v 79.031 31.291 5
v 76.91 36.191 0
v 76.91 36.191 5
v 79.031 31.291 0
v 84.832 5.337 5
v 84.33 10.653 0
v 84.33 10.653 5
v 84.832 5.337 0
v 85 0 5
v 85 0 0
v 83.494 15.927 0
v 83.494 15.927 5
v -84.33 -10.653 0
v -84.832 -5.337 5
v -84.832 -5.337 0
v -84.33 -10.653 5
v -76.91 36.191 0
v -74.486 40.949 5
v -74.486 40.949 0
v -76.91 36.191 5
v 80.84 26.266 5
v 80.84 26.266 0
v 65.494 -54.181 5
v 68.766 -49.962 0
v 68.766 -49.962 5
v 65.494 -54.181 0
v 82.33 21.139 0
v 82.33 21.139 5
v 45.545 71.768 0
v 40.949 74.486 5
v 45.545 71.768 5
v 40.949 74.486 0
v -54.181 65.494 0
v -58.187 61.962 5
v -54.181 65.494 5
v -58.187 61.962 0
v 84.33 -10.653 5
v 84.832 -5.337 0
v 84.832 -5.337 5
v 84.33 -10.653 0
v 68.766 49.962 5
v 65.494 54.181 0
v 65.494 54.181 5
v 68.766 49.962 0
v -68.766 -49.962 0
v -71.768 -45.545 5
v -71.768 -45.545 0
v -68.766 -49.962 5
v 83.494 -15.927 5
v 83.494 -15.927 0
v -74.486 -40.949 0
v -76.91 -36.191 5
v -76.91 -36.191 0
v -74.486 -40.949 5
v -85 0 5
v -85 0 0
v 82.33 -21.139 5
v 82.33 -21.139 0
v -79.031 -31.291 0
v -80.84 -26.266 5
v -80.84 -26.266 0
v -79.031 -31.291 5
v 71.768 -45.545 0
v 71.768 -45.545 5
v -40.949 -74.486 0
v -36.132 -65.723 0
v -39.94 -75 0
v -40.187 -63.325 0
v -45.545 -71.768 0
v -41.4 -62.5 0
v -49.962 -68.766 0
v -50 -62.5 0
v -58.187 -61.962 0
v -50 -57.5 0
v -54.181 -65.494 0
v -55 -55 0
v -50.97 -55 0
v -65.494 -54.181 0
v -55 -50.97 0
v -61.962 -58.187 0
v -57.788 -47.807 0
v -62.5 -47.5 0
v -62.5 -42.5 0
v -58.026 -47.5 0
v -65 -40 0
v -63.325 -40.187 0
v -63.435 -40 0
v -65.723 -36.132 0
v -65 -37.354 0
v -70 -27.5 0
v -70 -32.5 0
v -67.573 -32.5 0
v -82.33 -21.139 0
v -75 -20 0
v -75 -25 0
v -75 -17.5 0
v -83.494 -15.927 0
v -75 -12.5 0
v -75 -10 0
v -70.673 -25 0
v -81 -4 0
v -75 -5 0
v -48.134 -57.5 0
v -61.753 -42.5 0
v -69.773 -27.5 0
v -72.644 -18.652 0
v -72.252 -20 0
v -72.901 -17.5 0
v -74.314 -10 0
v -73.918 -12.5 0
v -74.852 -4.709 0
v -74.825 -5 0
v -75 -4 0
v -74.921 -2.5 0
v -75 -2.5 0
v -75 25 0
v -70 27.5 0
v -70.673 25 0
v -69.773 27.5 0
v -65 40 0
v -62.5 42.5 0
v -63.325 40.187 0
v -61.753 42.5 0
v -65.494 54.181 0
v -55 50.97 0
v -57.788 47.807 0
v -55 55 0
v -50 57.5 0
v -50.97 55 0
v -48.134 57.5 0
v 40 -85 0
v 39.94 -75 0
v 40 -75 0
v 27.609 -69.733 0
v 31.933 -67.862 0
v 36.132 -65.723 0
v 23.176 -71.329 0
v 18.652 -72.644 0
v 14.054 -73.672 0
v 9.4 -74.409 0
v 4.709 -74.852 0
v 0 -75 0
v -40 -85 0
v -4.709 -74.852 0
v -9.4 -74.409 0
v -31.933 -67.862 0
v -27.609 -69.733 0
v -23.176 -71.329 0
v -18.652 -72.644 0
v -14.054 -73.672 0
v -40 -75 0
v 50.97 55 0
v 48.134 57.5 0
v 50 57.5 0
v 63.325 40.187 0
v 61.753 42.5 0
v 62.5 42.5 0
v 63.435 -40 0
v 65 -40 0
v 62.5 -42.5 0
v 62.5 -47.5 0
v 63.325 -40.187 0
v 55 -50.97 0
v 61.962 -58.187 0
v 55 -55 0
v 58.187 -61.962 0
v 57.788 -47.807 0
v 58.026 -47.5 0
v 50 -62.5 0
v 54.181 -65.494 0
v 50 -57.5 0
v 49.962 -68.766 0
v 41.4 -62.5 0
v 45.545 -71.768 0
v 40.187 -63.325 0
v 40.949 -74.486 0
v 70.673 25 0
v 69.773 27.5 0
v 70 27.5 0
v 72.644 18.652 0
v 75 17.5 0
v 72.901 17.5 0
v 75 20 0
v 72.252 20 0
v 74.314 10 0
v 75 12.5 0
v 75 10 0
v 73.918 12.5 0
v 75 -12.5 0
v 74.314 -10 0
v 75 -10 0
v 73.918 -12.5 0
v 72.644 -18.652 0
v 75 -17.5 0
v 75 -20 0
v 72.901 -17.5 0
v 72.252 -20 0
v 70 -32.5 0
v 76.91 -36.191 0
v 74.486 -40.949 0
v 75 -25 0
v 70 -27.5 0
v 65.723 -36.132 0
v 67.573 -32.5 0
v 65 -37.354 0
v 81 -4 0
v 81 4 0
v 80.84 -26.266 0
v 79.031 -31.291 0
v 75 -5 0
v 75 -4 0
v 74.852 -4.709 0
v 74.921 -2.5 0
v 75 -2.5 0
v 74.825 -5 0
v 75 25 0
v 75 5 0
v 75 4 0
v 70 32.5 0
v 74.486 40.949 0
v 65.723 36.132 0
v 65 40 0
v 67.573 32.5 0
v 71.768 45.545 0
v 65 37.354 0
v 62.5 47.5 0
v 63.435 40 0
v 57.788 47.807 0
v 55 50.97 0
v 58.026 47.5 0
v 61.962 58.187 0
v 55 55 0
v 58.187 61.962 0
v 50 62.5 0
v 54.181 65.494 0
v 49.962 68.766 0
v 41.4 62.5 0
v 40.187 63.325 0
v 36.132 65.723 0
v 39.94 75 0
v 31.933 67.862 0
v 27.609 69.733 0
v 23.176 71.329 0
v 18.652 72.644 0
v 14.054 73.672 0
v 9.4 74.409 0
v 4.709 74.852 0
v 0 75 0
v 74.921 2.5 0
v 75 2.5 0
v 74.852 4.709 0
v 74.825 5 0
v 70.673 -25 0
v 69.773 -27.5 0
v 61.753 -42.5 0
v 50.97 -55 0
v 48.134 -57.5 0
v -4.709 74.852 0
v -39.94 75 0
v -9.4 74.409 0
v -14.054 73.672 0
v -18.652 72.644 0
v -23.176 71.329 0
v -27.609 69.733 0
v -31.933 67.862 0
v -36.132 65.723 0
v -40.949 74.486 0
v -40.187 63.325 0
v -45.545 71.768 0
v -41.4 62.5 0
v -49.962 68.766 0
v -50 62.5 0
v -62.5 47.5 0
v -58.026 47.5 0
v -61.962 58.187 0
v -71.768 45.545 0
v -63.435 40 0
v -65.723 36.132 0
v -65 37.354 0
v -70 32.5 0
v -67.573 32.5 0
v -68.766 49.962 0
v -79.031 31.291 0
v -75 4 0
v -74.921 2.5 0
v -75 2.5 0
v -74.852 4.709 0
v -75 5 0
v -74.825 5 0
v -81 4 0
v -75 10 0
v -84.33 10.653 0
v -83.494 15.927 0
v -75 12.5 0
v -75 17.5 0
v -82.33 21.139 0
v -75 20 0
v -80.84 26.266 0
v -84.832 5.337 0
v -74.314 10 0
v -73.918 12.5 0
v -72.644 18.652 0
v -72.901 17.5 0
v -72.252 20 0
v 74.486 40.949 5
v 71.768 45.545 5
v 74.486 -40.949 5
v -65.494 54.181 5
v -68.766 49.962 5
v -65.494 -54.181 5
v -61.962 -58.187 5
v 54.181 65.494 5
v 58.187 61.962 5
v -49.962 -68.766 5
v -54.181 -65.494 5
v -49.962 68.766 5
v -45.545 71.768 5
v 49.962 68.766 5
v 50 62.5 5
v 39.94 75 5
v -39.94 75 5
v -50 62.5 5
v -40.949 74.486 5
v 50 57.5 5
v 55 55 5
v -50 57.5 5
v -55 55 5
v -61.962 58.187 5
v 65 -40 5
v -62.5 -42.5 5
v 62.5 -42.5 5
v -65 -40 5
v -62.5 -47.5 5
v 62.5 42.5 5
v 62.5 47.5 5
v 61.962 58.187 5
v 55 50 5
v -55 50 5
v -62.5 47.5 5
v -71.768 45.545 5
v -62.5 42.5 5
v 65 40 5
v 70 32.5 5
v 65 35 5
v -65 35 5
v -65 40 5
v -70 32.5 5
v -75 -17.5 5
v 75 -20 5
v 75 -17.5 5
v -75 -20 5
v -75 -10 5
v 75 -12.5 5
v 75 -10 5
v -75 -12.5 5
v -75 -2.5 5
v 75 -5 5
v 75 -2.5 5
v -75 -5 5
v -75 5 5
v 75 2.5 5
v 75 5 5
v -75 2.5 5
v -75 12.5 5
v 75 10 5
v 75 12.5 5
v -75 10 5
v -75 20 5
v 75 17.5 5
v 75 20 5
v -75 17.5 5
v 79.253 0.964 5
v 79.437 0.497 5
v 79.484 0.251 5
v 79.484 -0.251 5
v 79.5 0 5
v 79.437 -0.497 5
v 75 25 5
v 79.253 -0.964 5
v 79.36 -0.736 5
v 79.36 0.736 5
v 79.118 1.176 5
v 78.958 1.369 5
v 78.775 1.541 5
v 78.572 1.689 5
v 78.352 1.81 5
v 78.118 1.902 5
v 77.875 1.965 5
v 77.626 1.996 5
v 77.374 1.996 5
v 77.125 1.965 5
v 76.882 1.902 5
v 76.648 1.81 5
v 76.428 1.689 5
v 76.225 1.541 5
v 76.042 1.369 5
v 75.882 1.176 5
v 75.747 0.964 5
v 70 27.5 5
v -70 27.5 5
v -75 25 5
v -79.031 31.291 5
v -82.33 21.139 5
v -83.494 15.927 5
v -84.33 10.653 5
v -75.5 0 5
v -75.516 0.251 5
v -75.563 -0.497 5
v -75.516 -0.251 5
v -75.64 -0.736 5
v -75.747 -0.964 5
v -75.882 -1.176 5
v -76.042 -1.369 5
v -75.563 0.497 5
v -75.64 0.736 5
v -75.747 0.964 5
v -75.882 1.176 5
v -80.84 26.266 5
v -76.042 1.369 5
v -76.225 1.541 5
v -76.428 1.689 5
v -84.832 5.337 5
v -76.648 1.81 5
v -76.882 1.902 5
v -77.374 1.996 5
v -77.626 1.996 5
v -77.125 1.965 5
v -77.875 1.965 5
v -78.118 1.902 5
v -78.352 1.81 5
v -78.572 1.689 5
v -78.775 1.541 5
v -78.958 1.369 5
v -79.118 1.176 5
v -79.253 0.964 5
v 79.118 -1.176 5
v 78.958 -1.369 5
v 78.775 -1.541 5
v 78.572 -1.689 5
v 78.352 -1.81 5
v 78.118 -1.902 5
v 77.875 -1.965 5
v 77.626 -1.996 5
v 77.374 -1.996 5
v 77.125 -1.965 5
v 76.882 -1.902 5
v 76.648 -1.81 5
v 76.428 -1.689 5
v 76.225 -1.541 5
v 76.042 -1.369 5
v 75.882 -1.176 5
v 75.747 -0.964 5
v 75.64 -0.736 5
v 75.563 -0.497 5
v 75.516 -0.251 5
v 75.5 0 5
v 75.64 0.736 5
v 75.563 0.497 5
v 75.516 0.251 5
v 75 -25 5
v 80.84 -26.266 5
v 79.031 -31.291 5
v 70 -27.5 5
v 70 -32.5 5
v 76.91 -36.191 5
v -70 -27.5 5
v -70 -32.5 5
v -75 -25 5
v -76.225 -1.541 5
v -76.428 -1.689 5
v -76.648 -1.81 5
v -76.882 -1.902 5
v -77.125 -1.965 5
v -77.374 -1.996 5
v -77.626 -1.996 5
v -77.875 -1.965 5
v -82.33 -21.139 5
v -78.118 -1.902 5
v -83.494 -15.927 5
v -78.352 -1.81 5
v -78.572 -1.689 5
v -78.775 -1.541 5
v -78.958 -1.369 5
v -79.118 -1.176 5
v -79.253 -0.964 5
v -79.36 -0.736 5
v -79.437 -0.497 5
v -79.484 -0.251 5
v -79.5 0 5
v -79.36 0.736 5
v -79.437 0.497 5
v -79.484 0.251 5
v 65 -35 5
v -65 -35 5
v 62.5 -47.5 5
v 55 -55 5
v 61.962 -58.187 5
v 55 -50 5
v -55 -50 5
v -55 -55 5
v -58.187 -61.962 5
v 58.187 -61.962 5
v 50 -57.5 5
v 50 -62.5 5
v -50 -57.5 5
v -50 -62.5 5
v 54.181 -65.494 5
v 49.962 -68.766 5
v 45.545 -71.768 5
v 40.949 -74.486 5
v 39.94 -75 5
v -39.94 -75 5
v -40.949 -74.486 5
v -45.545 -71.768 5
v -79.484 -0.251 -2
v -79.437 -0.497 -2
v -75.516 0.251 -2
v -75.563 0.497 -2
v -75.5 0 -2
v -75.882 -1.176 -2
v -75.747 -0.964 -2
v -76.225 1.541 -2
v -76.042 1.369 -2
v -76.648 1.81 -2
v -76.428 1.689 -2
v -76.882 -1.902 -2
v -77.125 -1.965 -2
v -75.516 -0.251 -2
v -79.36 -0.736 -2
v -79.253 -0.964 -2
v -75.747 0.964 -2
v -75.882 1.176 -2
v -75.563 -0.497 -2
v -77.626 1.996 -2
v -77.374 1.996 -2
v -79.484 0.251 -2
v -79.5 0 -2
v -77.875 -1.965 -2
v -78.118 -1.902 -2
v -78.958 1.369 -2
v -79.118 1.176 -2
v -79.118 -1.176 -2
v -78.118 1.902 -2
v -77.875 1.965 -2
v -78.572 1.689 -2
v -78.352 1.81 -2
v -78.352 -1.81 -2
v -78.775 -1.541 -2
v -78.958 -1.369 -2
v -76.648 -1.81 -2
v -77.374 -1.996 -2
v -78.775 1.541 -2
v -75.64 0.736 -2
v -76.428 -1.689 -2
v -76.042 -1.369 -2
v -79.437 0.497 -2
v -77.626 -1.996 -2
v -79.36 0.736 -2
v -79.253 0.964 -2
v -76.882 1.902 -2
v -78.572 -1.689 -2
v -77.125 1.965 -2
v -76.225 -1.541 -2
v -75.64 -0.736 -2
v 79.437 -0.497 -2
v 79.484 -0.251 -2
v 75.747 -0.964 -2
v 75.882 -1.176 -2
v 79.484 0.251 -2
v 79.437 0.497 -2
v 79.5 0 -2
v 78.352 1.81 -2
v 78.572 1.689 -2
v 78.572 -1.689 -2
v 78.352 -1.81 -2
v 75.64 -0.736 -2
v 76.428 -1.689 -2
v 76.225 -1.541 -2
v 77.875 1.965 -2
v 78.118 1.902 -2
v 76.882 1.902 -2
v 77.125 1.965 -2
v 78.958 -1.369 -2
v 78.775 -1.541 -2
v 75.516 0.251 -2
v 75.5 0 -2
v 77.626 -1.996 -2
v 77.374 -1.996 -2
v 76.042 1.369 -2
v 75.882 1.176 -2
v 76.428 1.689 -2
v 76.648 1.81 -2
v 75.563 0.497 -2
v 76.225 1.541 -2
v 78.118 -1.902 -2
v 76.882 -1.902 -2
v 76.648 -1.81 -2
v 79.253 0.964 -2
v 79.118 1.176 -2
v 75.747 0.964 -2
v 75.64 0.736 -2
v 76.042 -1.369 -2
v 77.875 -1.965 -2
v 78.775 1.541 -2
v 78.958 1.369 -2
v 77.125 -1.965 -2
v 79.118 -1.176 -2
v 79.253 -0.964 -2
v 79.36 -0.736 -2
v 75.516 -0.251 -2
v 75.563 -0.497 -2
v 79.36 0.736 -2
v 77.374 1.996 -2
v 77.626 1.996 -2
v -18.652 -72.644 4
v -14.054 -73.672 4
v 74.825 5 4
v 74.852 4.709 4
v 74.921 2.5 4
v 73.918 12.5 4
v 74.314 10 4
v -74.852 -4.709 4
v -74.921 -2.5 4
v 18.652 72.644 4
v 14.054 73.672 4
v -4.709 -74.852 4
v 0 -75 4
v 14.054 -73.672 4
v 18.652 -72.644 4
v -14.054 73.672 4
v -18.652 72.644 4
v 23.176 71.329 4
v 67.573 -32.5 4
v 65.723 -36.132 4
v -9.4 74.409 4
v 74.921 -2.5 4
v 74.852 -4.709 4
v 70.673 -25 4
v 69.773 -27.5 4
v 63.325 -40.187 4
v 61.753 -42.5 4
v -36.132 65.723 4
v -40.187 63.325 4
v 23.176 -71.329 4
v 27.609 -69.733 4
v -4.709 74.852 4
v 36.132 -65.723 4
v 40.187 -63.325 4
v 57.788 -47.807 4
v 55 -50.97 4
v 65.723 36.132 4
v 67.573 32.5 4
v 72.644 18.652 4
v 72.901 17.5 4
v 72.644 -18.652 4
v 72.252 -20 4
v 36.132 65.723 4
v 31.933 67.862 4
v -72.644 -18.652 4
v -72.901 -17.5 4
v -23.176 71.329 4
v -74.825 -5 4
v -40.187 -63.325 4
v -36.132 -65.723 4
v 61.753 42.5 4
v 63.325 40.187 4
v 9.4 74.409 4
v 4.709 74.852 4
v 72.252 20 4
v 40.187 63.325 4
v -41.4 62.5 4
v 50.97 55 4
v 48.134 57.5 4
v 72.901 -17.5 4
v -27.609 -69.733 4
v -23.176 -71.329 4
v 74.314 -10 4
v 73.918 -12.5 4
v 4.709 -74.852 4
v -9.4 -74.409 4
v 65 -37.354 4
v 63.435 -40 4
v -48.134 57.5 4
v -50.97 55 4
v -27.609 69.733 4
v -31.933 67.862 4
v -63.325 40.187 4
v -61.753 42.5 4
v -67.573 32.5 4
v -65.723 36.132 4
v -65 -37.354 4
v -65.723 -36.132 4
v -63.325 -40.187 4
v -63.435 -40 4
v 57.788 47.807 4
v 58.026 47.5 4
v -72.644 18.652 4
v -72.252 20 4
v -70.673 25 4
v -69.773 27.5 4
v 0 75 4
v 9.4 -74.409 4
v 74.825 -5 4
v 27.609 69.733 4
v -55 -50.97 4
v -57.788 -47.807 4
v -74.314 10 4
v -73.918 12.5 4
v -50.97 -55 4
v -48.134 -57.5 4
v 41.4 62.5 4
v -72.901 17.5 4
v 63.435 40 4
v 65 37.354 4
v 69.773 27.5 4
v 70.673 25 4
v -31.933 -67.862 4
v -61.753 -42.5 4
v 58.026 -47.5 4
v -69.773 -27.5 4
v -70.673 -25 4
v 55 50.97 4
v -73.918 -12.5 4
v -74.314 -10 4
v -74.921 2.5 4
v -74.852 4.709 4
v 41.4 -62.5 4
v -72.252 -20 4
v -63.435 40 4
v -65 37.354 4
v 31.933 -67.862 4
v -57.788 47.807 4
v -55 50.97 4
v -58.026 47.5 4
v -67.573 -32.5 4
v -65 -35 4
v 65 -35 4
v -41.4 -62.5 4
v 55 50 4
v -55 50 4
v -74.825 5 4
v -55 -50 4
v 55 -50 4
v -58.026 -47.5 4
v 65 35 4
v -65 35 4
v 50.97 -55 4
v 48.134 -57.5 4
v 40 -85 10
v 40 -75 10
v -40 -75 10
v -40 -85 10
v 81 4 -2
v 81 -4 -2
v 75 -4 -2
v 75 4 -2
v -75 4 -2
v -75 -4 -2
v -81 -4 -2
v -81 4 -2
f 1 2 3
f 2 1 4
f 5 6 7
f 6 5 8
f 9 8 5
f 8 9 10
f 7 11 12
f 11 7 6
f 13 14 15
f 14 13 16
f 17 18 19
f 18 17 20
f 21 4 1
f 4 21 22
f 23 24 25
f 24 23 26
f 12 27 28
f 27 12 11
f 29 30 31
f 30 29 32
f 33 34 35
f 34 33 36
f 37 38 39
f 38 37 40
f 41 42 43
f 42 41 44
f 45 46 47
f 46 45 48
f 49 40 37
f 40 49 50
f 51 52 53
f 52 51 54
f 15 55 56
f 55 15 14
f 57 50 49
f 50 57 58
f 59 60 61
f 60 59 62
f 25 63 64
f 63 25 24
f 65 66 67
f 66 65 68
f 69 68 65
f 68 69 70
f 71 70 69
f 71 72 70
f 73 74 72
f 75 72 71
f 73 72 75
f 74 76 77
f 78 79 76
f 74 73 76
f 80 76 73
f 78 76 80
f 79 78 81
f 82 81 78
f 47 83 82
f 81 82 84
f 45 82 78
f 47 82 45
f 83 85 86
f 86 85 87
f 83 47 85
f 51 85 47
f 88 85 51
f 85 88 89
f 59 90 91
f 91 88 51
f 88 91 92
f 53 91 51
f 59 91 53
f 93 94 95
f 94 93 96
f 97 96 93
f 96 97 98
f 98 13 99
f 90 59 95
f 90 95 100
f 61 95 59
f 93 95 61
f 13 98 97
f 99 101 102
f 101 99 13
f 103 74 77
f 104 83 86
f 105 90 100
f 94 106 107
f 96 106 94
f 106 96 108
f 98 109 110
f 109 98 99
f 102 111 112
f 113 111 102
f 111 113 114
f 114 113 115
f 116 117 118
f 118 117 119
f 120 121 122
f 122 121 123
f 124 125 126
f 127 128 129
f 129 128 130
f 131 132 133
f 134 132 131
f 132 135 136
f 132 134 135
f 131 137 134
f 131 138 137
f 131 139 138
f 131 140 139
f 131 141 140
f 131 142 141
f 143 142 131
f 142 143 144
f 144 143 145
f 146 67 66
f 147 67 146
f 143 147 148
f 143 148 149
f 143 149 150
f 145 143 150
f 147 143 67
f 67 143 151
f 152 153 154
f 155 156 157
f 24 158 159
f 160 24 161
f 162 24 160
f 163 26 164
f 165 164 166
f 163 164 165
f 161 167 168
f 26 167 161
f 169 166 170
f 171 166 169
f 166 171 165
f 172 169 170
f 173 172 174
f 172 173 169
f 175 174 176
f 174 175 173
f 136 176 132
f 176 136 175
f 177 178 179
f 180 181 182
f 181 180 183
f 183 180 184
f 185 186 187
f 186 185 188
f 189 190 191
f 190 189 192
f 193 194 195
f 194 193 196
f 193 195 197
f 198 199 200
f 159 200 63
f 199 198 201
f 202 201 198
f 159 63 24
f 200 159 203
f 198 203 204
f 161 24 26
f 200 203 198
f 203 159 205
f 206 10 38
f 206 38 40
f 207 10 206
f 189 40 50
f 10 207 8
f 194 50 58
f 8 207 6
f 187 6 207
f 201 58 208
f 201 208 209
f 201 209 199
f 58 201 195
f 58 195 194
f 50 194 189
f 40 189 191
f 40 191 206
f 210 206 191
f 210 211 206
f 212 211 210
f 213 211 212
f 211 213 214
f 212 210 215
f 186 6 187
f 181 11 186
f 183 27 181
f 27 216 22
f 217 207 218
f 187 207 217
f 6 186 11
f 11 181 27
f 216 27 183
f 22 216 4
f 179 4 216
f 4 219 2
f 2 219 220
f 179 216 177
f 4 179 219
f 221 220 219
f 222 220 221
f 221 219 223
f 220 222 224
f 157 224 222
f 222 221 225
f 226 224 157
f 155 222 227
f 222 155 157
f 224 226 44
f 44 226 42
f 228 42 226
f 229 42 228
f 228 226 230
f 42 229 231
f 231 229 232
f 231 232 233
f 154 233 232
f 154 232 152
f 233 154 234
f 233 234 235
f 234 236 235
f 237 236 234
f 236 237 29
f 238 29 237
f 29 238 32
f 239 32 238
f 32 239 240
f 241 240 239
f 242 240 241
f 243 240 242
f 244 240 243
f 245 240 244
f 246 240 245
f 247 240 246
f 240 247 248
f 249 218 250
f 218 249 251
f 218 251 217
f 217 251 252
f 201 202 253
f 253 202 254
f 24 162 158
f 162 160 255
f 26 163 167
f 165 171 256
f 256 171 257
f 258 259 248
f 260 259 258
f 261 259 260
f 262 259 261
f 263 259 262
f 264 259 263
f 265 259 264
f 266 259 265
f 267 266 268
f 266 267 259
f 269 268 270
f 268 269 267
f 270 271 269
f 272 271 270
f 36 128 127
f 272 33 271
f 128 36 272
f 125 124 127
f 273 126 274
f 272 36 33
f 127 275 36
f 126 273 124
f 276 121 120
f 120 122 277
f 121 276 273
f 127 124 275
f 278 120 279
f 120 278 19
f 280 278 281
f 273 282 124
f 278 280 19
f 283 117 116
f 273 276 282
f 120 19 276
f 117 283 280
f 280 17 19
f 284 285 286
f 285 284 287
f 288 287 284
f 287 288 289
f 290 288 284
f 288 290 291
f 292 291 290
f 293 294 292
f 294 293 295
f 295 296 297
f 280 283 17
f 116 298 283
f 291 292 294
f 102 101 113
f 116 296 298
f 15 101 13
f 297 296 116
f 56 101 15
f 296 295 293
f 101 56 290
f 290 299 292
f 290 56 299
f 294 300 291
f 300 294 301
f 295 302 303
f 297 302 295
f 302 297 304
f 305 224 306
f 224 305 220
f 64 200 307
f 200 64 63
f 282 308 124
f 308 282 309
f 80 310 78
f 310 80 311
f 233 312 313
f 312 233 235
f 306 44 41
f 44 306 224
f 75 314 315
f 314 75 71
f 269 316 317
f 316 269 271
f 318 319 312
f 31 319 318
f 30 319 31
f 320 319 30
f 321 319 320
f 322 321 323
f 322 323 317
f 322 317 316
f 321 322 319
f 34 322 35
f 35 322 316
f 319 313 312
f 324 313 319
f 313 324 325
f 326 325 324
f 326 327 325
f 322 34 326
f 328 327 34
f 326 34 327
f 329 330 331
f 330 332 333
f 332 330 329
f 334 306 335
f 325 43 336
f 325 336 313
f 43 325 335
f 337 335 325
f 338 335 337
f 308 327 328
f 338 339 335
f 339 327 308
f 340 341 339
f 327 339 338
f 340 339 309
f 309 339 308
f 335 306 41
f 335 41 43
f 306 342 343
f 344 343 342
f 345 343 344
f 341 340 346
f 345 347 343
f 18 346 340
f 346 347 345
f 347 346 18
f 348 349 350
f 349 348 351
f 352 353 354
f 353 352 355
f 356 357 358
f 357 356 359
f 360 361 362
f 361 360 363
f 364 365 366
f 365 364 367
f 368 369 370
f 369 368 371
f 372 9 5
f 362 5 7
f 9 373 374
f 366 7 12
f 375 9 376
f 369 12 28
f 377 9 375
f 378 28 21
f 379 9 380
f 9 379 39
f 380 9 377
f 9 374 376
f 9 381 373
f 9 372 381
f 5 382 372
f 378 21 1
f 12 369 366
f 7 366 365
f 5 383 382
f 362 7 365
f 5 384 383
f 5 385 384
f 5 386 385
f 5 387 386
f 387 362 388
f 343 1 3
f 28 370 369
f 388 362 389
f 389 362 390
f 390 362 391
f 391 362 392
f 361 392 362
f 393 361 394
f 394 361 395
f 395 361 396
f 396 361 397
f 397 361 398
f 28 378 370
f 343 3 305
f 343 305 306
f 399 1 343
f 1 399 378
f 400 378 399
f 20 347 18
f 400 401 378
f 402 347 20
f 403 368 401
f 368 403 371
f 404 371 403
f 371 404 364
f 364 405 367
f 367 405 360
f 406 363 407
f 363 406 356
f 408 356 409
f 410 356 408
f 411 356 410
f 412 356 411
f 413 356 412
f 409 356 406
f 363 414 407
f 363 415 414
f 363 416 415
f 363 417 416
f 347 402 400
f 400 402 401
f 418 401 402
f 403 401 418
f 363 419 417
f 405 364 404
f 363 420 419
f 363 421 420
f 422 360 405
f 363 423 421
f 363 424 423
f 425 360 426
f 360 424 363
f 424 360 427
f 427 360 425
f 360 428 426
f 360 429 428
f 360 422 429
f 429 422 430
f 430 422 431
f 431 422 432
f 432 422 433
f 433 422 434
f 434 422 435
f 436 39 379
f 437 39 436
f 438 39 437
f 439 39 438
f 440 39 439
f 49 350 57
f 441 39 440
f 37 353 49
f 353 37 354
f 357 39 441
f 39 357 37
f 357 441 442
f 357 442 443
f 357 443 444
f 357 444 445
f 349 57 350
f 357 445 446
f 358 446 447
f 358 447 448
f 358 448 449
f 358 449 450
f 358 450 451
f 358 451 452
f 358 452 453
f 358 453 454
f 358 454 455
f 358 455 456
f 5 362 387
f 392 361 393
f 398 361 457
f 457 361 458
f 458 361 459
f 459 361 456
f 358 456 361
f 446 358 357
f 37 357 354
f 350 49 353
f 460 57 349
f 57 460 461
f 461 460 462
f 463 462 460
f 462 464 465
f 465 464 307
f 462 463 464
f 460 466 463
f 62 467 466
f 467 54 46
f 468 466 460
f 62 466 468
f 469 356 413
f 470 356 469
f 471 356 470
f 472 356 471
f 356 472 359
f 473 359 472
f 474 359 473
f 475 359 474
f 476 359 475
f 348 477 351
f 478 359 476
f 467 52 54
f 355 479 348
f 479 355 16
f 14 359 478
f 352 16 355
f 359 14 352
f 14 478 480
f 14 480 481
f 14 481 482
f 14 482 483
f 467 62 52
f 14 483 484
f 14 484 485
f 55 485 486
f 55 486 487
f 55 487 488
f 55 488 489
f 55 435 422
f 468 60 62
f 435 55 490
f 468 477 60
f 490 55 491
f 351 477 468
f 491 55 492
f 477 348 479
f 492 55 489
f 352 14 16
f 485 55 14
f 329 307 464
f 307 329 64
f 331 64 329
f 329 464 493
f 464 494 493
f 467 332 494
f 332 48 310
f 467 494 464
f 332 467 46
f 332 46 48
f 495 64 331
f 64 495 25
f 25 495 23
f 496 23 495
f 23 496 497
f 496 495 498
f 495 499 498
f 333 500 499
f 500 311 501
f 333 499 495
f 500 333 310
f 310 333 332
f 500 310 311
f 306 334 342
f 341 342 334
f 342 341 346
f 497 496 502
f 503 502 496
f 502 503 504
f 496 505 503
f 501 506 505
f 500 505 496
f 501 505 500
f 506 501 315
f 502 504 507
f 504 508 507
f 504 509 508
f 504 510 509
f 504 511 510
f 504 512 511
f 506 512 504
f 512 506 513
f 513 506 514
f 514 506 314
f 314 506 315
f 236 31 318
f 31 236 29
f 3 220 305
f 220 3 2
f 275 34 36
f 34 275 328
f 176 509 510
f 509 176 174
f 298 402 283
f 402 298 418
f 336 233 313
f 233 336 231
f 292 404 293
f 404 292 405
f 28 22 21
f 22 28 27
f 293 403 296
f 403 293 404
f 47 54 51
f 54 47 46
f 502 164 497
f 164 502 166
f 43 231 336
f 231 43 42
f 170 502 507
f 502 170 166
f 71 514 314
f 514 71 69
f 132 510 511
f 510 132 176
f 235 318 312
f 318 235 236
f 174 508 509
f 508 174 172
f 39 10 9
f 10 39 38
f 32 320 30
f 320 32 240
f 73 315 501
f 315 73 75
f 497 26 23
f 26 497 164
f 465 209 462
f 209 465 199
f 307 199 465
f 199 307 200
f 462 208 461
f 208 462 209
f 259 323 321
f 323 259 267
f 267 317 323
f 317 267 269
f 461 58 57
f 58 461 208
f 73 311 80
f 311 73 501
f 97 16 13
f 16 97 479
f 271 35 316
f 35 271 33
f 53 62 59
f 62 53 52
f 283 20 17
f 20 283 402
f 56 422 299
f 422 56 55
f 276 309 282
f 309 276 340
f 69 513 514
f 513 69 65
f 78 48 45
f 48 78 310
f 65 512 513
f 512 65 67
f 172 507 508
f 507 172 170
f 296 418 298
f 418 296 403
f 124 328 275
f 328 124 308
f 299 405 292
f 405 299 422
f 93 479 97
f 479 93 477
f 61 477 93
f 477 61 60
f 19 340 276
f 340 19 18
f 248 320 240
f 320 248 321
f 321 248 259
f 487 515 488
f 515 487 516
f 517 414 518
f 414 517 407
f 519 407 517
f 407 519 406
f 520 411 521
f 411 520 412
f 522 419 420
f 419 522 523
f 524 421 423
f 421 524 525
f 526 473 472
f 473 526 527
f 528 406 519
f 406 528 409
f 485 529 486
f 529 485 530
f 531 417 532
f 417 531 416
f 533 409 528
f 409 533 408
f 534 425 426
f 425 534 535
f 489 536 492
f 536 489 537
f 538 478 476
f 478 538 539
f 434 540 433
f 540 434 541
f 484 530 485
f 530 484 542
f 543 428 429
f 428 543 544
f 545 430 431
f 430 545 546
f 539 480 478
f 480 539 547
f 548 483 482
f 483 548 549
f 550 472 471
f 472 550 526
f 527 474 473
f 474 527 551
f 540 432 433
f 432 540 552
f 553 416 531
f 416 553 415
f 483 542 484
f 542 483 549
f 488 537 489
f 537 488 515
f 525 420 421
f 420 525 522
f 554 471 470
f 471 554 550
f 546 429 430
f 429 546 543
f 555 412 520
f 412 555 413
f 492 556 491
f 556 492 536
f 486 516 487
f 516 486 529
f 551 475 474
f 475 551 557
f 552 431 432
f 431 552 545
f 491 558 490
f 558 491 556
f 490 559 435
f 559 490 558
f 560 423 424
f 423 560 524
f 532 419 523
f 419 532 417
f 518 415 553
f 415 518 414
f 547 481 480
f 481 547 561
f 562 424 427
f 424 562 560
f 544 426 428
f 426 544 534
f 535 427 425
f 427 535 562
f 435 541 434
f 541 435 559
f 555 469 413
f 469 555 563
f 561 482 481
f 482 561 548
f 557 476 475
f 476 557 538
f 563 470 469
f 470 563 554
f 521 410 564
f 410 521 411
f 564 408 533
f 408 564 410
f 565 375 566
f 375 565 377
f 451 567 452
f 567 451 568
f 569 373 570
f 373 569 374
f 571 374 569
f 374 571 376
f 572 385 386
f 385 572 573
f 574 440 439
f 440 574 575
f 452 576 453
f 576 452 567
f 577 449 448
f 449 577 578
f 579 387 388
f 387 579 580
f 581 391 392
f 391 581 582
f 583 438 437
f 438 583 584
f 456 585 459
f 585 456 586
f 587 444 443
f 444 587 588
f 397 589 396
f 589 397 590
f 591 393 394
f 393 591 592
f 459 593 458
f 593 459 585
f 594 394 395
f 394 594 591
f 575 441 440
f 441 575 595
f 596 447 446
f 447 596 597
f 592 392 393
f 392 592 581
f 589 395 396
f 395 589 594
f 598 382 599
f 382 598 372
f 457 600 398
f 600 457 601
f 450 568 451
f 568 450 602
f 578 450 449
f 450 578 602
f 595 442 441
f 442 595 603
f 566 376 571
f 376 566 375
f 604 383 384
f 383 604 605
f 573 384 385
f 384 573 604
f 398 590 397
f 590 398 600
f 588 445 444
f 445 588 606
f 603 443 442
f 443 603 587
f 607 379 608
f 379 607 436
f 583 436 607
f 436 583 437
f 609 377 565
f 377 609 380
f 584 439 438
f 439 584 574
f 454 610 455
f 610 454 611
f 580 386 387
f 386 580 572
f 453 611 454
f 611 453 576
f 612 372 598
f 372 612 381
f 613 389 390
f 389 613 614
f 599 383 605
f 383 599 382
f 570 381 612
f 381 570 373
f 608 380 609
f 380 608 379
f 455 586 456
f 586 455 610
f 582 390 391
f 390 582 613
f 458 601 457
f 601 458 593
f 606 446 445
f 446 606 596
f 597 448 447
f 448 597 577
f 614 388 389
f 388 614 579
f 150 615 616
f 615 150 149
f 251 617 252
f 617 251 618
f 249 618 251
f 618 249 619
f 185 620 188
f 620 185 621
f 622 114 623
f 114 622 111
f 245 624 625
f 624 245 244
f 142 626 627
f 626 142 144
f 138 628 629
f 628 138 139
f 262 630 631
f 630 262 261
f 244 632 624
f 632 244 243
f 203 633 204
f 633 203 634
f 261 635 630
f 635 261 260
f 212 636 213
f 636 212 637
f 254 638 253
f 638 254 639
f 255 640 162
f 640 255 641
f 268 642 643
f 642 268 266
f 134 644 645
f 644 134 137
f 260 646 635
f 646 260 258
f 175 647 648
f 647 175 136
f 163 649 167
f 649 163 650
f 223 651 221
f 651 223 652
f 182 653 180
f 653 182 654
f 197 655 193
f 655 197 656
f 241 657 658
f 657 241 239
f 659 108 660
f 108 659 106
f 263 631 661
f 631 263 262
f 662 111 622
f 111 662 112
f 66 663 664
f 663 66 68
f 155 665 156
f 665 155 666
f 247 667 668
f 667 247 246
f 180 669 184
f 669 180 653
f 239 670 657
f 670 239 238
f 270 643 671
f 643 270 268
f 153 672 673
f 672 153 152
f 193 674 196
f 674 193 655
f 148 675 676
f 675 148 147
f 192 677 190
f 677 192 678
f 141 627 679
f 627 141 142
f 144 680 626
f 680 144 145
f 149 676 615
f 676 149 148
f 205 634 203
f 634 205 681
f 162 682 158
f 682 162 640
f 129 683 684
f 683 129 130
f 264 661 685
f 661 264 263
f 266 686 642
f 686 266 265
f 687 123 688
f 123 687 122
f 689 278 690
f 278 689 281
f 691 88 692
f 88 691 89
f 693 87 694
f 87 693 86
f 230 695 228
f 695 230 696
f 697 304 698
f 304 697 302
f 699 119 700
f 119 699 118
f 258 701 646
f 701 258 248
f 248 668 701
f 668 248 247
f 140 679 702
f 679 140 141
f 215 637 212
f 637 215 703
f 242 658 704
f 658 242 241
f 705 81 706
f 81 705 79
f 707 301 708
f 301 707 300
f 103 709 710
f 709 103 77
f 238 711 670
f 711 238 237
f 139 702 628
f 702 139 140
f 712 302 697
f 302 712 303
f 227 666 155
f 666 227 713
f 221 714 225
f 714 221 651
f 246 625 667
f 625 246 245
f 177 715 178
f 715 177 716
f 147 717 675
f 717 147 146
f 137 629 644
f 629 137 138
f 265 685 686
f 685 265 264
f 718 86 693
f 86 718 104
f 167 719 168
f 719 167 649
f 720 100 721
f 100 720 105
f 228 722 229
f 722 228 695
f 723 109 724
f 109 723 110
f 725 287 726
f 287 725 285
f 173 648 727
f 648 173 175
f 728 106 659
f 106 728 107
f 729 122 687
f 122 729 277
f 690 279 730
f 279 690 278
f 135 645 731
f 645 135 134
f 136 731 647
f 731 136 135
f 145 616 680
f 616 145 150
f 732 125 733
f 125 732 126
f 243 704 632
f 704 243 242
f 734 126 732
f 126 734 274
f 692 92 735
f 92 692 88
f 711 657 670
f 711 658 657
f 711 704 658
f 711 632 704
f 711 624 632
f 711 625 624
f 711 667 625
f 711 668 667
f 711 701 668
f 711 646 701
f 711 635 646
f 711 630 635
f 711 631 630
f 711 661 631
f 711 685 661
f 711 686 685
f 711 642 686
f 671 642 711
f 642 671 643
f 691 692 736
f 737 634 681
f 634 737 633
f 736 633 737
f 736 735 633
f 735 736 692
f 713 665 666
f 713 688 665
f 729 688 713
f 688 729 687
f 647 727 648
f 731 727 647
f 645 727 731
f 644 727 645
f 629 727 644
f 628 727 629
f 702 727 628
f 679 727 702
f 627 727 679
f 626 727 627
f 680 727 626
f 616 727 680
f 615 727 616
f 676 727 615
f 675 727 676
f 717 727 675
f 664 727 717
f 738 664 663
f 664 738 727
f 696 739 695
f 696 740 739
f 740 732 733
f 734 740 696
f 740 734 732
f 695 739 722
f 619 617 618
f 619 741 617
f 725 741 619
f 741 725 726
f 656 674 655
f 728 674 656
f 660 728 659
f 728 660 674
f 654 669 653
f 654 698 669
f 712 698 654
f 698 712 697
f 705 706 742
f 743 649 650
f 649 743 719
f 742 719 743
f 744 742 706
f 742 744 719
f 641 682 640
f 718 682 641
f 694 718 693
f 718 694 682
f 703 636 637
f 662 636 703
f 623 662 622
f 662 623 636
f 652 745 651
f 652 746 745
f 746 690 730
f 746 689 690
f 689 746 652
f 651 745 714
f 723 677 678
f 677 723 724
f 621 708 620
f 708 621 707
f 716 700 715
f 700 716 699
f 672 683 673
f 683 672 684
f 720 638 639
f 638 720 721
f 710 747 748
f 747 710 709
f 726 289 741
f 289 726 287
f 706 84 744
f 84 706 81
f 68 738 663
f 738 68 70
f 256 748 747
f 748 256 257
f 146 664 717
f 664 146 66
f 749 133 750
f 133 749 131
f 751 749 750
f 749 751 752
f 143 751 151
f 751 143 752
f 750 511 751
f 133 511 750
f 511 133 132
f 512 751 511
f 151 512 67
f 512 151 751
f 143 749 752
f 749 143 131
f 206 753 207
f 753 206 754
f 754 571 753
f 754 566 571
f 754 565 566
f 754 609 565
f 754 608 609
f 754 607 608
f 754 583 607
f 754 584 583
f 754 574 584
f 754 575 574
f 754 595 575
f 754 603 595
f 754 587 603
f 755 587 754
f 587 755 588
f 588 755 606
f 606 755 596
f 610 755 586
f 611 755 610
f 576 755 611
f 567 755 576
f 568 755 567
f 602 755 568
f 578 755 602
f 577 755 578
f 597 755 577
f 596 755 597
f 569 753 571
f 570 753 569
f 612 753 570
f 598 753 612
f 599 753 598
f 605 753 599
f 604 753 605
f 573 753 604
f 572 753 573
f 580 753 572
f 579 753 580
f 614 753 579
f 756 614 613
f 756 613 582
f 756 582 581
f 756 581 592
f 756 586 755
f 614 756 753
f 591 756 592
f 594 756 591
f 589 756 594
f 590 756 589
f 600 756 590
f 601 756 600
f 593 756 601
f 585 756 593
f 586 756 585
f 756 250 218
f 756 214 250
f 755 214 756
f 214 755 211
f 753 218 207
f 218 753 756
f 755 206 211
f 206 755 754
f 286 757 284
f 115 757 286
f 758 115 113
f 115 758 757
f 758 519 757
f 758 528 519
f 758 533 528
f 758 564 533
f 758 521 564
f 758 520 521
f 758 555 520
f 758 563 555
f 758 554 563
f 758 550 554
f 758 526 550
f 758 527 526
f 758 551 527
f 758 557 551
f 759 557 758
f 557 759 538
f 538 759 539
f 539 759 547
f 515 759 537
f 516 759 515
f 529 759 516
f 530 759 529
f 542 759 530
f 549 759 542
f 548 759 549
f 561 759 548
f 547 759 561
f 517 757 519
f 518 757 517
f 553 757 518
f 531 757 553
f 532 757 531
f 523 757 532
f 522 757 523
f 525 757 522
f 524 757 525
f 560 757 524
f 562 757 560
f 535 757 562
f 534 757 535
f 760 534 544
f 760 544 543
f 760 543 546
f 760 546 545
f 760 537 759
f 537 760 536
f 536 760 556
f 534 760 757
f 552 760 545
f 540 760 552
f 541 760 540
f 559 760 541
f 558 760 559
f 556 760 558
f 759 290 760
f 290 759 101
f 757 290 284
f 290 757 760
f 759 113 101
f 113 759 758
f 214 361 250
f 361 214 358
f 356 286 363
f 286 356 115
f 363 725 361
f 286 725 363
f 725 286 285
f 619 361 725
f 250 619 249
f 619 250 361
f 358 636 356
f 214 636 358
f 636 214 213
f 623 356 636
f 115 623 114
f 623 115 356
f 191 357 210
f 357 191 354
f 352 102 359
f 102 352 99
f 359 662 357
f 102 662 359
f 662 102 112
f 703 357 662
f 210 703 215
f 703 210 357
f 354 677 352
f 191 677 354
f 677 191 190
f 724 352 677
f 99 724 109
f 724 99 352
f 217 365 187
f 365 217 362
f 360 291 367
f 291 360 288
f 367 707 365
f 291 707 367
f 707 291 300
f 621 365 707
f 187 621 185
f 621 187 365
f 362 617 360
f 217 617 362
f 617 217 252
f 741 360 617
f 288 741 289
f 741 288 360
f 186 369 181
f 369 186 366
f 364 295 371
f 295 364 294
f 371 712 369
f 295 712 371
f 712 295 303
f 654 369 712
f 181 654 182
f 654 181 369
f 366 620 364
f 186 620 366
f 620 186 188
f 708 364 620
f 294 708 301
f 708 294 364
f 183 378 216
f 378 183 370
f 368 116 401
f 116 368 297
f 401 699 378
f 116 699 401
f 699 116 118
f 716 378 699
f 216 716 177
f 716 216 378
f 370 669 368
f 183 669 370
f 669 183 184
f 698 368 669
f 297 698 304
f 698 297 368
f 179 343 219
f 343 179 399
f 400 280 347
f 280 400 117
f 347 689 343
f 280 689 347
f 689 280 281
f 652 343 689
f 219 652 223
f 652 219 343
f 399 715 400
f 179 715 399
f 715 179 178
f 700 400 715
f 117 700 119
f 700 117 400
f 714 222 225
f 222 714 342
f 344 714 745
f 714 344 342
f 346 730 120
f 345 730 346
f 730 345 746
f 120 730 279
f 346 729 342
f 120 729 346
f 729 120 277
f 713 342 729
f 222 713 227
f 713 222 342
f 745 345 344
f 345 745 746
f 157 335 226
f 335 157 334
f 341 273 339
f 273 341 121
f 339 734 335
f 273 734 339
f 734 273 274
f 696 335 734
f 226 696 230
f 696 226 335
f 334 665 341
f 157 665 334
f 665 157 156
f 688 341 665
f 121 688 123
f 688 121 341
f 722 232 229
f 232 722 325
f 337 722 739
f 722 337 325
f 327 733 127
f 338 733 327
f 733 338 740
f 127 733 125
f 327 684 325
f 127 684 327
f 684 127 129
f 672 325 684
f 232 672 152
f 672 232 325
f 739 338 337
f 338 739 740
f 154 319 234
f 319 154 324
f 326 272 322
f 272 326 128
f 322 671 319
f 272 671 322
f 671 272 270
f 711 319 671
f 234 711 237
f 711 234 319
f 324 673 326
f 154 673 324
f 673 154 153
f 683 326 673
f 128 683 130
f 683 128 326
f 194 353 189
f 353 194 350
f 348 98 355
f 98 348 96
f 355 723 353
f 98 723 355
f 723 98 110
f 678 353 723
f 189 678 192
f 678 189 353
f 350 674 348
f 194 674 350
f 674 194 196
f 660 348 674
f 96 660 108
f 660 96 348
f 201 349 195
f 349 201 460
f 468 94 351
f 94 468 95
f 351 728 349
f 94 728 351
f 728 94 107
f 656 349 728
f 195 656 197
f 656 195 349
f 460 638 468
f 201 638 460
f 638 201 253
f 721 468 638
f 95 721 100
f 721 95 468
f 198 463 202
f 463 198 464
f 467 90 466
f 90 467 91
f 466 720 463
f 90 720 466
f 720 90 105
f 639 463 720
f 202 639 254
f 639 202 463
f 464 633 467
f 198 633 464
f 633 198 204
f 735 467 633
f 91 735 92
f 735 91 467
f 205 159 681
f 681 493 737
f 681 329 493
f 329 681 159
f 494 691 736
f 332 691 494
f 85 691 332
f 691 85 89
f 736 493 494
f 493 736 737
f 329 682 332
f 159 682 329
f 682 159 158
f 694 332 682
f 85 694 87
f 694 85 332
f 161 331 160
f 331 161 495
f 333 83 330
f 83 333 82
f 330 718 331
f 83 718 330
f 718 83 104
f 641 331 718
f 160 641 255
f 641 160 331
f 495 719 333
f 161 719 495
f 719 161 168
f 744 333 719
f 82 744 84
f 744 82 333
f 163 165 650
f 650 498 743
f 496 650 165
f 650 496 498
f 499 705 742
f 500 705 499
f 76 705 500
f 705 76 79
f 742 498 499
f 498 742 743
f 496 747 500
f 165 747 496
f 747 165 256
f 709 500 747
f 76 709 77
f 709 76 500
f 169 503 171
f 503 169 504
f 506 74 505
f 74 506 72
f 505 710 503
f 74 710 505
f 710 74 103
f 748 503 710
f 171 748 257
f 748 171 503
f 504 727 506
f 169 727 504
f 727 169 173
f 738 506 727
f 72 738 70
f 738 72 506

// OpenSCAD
module outerf(){
difference(){ 
cylinder(r=85,$fn=100,h=5);
translate([-40,75,-1])
cube([80,10,8]);
translate([-77.5,0,-2])
cylinder(r=2,$fn=50,h=8);
translate([77.5,0,-2])
cylinder(r=2,$fn=50,h=8);
translate([0,0,0])
cylinder(r=75,$fn=100,h=04);
translate([-40,75,-1])
cube([80,10,10]);
    }
}
module box(){
outerf();
translate([-40,-85,0])
cube([80,10,10]);
translate([75,-4,-2])
cube([6,8,5]);
translate([-81,-4,-2])
cube([6,8,5]);}



difference(){
box();

translate([-75,-2.5,0])
cube([150,5,6])  ;  
translate([-75,-10,0])
cube([150,5,6])  ;     
translate([-75,5,0])
cube([150,5,6])  ;     
translate([-75,12.5,0])
cube([150,5,6])  ;     
translate([-75,20,0])
cube([150,5,6])  ;     
translate([-70,27.5,0])
cube([140,5,6])  ;

translate([-65,35,0])
cube([130,5,6])  ;
translate([-62.5,42.5,0])
cube([125,5,6])  ;    
translate([-55,50,0])
cube([110,5,6])  ;
translate([-50,57.5,0])
cube([100,5,6])  ; 
 
translate([-75,-17.5,0])
cube([150,5,6])  ;     
translate([-75,-25,0])
cube([150,5,6])  ;     
translate([-70,-32.5,0])
cube([140,5,6])  ;
 translate([-65,-40,0])
cube([130,5,6])  ;
translate([-62.5,-47.5,0])
cube([125,5,6])  ;    
translate([-55,-55,0])
cube([110,5,6])  ;
translate([-50,-62.5,0])
cube([100,5,6])  ; 
 
translate([-77.5,0,-2])
cylinder(r=2,$fn=50,h=8);
translate([77.5,0,-2])
cylinder(r=2,$fn=50,h=8);}    
